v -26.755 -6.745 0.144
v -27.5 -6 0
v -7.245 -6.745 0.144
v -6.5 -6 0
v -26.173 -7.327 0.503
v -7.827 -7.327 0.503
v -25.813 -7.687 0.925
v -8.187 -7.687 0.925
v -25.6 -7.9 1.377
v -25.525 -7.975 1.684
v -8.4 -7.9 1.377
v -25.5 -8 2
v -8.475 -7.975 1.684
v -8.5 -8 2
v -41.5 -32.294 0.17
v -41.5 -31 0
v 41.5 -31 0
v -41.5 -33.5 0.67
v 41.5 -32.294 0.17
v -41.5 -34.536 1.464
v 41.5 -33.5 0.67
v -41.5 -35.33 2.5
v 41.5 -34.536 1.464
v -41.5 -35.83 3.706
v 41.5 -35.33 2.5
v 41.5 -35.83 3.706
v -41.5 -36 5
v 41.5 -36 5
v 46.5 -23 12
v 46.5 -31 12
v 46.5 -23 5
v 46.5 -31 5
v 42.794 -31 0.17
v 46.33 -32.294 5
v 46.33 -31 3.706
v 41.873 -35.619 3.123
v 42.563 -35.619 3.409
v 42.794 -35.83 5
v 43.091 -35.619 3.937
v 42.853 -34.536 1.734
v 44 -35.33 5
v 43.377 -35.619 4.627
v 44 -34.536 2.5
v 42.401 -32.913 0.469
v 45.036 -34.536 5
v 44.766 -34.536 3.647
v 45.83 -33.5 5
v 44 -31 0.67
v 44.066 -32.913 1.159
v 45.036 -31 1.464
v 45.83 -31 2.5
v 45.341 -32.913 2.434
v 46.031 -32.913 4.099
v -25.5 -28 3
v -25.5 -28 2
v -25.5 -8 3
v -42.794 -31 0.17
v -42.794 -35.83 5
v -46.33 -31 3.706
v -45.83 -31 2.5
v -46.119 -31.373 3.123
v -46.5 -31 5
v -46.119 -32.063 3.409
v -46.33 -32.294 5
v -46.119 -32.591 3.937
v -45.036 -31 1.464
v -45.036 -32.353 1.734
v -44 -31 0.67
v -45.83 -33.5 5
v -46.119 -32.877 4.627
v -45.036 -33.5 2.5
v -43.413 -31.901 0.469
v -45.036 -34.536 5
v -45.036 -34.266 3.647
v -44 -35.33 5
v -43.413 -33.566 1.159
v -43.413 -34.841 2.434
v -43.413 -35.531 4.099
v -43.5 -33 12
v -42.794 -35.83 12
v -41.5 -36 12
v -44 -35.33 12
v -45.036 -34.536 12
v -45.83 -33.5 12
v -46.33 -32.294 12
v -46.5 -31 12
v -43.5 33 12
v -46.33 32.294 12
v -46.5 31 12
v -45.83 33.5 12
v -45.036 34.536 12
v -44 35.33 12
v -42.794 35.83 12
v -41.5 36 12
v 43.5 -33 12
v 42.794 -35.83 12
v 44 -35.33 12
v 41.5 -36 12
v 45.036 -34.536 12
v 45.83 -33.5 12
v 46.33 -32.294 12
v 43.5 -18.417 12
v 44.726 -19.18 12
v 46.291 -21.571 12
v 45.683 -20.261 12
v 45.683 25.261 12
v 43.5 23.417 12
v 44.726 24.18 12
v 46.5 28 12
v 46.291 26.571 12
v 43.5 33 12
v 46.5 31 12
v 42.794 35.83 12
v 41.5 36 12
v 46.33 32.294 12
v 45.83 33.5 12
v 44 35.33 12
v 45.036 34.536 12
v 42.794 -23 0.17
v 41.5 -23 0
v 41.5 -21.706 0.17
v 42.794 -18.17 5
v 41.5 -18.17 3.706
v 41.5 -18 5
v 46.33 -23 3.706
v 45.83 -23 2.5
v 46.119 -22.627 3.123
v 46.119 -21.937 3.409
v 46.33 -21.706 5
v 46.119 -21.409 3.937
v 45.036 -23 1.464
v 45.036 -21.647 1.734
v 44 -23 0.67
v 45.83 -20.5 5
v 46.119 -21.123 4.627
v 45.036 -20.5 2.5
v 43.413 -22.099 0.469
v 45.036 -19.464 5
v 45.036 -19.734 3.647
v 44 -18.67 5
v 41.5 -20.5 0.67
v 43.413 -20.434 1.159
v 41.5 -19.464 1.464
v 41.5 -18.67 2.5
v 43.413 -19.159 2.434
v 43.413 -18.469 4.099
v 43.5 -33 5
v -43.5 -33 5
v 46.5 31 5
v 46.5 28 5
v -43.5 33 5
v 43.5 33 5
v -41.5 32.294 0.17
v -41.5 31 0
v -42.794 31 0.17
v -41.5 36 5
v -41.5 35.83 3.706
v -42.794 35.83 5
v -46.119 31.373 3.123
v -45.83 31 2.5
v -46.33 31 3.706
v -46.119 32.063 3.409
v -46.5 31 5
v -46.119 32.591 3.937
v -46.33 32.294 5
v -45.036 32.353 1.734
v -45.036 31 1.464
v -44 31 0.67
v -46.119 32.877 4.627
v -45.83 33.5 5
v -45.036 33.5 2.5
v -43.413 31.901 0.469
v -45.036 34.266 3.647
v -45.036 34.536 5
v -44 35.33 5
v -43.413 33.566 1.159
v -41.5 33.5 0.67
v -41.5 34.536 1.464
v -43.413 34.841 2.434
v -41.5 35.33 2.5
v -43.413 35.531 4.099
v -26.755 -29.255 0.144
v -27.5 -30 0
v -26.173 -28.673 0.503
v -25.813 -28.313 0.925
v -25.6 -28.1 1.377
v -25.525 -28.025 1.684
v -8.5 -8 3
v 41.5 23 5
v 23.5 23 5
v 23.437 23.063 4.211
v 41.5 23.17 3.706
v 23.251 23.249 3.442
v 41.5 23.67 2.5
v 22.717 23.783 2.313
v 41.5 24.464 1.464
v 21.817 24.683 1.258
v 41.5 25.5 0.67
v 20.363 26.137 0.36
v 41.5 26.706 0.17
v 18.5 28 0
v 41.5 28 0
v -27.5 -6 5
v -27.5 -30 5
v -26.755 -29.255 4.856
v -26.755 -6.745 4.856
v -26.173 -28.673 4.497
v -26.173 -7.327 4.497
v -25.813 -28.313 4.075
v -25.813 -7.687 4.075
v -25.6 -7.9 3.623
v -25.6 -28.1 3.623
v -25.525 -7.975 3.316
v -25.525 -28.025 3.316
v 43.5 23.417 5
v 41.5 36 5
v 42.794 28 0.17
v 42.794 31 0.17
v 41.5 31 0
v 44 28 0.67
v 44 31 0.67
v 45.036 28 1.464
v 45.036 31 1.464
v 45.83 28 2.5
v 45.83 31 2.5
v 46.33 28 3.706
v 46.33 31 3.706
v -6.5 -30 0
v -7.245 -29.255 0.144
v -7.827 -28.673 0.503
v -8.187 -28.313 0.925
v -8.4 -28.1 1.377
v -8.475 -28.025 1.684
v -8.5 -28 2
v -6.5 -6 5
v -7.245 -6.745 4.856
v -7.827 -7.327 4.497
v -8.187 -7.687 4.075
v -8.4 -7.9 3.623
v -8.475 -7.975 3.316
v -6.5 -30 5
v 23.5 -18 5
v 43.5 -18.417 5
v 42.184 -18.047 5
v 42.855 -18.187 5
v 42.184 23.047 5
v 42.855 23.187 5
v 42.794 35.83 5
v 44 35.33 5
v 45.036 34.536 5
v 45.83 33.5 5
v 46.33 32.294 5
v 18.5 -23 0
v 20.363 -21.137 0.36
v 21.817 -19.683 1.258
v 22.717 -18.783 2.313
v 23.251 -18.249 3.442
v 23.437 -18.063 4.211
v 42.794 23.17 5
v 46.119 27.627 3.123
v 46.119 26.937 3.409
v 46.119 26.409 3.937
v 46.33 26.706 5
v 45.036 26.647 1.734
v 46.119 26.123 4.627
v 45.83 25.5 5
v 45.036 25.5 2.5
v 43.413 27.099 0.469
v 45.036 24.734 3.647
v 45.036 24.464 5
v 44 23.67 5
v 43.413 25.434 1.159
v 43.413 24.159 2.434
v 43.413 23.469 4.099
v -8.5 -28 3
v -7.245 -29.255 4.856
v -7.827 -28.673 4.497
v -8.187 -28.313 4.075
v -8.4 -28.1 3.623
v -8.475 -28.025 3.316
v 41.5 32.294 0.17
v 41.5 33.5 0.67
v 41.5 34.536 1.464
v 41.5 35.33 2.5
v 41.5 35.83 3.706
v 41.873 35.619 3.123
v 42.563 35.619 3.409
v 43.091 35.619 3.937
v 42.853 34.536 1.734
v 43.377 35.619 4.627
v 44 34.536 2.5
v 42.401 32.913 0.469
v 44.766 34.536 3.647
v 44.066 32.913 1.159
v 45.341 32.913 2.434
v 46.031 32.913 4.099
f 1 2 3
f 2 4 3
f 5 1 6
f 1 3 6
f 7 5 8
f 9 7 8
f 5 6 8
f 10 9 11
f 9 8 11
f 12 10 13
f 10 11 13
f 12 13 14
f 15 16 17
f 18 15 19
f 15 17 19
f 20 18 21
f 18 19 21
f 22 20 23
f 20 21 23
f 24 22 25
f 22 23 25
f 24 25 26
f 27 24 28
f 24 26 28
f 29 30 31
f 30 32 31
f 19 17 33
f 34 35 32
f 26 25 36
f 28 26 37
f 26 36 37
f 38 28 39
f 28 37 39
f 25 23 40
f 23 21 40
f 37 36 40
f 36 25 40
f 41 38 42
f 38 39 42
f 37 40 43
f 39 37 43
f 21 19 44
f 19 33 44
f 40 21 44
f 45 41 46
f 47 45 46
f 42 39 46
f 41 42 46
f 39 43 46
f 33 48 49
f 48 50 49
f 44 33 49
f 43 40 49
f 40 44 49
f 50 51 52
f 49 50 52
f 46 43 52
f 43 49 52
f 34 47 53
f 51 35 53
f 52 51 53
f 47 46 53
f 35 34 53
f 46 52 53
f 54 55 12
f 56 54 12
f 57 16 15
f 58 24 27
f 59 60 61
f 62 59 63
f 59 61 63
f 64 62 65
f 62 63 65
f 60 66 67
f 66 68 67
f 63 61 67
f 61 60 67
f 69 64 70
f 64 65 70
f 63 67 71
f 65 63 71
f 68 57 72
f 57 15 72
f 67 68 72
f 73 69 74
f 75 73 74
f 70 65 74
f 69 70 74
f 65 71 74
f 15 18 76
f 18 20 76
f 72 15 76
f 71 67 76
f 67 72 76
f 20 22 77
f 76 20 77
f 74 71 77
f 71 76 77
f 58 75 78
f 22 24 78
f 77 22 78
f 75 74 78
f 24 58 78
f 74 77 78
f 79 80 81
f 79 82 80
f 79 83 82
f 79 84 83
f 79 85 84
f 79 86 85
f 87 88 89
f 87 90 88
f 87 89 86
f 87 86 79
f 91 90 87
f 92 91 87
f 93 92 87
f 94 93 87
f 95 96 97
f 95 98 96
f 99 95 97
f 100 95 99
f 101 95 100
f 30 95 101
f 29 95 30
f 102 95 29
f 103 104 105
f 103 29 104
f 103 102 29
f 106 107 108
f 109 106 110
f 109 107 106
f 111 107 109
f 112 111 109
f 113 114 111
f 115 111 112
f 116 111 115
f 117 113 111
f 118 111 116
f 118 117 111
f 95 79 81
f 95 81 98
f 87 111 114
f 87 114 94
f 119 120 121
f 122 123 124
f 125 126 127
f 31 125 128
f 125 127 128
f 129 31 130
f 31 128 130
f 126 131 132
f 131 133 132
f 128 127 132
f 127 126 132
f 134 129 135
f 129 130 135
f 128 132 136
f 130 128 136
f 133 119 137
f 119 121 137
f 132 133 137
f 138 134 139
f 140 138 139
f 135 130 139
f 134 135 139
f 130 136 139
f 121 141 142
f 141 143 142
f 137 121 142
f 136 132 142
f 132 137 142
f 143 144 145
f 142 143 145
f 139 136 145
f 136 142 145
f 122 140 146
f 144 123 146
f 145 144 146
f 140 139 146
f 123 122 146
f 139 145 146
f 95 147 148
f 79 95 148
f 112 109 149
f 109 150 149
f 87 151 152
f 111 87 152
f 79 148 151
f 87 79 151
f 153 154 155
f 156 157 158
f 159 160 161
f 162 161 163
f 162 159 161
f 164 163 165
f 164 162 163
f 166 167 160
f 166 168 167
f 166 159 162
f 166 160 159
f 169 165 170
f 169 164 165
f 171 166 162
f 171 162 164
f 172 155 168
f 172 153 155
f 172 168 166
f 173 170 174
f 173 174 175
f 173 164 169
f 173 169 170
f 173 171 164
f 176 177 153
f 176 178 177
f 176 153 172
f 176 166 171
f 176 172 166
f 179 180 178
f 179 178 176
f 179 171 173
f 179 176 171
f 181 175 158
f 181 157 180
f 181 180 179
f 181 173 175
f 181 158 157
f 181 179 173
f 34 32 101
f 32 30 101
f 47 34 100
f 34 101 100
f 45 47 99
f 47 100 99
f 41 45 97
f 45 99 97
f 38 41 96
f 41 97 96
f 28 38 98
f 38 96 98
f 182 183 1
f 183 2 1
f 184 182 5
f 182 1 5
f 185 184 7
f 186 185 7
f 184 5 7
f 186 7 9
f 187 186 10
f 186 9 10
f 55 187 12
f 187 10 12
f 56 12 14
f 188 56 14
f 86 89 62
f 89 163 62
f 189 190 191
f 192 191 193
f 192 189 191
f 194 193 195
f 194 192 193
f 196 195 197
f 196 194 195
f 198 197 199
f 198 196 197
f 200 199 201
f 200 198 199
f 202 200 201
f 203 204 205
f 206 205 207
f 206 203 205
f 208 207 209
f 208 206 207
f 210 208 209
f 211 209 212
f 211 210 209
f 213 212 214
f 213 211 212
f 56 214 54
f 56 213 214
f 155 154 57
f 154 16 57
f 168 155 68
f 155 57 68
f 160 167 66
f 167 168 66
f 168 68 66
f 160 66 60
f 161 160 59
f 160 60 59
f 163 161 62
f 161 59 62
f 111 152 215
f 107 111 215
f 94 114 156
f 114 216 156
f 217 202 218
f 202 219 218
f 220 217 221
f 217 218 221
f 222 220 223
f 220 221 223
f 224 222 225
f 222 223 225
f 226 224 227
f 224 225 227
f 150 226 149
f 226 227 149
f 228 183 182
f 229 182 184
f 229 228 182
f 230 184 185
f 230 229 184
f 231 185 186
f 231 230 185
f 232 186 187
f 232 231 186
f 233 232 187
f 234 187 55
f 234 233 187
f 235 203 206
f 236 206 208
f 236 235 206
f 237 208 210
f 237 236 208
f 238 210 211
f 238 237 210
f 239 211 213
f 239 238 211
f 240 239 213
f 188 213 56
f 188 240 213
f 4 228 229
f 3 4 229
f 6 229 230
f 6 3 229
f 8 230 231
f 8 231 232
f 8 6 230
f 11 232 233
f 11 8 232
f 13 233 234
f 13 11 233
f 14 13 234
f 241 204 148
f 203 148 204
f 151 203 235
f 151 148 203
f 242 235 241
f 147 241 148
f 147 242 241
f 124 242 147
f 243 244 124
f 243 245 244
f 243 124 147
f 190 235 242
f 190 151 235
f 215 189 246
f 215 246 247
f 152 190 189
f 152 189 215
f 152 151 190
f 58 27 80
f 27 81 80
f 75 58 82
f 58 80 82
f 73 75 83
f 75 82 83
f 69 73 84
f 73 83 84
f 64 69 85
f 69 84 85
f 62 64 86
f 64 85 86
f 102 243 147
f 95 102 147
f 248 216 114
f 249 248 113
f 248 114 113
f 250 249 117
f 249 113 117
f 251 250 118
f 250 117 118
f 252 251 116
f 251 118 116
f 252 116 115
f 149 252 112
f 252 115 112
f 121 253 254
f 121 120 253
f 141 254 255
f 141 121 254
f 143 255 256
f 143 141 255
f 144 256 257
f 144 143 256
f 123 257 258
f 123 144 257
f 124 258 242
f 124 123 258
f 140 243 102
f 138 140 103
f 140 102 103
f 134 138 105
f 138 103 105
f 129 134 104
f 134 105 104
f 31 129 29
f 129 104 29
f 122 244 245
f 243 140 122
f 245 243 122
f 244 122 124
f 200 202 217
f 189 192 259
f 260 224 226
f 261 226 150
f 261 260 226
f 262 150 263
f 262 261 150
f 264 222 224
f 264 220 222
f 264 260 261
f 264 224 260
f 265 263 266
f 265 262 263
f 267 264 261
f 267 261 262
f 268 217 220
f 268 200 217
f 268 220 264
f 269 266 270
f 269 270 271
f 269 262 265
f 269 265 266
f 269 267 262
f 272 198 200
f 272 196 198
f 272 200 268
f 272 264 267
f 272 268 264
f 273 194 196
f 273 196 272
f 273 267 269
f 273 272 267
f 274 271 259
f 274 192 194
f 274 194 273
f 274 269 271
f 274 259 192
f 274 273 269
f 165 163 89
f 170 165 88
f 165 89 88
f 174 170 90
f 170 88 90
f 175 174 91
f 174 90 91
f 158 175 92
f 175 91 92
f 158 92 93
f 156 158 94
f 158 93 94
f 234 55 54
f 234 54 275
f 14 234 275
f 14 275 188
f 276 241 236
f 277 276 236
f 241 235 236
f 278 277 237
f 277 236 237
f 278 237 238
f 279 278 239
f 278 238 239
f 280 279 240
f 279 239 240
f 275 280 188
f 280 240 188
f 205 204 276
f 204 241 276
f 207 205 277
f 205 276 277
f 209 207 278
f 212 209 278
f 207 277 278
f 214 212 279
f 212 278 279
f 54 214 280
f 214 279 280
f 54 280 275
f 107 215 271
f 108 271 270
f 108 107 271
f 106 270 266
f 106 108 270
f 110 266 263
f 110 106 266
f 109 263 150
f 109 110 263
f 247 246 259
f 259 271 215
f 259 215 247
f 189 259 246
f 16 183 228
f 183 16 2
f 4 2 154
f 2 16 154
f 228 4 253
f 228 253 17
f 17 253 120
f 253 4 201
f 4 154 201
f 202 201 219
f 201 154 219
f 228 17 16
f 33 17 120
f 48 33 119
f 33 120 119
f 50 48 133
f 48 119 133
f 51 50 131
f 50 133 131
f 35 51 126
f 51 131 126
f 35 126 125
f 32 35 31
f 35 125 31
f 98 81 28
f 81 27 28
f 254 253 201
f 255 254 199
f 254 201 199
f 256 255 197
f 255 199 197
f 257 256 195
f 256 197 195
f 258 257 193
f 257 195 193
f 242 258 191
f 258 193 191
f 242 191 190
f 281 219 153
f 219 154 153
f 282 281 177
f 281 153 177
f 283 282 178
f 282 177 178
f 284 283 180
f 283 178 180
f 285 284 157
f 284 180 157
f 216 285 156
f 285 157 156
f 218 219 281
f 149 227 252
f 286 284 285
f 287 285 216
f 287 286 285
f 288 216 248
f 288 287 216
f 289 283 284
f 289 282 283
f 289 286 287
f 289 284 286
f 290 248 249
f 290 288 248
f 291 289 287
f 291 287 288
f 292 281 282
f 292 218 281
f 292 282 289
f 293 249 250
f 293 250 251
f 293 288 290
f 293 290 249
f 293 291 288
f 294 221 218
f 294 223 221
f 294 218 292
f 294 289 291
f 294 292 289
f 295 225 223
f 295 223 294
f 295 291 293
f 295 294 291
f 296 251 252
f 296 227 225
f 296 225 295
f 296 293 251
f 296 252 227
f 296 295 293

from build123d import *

# Parameters (mm, degrees)
F1_DEPTH = 12
F0_W     = 17
F0_H     = 20
F2_DEPTH = 5
F3_R     = 4.99999
F4_R     = 2


# Not quite as in the source:
# - a fillet or chamfer is up to 0.001 mm smaller than in the source, because OpenCascade refuses the exact size


with BuildPart() as f1:
    # F0 (on Top) → F1 (new body)
    with BuildSketch(Plane.XY):
        Polygon((-43.5, 33), (43.5, 33), (43.5, 23), (46.5, 23), (46.5, 36), (-46.5, 36), (-46.5, -36), (46.5, -36), (46.5, -18), (43.5, -18), (43.5, -33), (-43.5, -33), align=None)
    extrude(amount=F1_DEPTH)

    # F0 (on Top) → F2 (join)
    with BuildSketch(Plane.XY):
        Polygon((43.5, 23), (43.5, 33), (-43.5, 33), (-43.5, -33), (43.5, -33), (43.5, -18), (23.5, -18), (23.5, 23), align=None)
        with Locations((-17, -18)):
            Rectangle(F0_W, F0_H, mode=Mode.SUBTRACT)
    extrude(amount=F2_DEPTH)

    # F3 (radius 5 in the source; OpenCascade refuses exactly that, so slightly less here)
    f3_edges = [f1.edges().sort_by_distance(p)[0] for p in [
        (23.5, 2.5, 0),
        (35, -18, 0),
        (35, 23, 0),
        (46.5, 29.5, 0),
        (46.5, -27, 0),
        (0, -36, 0),
        (0, 36, 0),
        (-46.5, 0, 0),
        (-46.5, 36, 6),
        (46.5, 36, 6),
        (46.5, -36, 6),
        (-46.5, -36, 6),
        (46.5, -18, 6),
        (46.5, 23, 6),
    ]]
    fillet(f3_edges, radius=F3_R)

    # F4
    f4_edges = [f1.edges().sort_by_distance(p)[0] for p in [
        (-25.5, -18, 5),
        (-17, -28, 5),
        (-17, -8, 5),
        (-8.5, -18, 5),
        (-17, -8, 0),
        (-25.5, -18, 0),
        (-17, -28, 0),
        (-8.5, -18, 0),
    ]]
    fillet(f4_edges, radius=F4_R)


solid = f1.part
